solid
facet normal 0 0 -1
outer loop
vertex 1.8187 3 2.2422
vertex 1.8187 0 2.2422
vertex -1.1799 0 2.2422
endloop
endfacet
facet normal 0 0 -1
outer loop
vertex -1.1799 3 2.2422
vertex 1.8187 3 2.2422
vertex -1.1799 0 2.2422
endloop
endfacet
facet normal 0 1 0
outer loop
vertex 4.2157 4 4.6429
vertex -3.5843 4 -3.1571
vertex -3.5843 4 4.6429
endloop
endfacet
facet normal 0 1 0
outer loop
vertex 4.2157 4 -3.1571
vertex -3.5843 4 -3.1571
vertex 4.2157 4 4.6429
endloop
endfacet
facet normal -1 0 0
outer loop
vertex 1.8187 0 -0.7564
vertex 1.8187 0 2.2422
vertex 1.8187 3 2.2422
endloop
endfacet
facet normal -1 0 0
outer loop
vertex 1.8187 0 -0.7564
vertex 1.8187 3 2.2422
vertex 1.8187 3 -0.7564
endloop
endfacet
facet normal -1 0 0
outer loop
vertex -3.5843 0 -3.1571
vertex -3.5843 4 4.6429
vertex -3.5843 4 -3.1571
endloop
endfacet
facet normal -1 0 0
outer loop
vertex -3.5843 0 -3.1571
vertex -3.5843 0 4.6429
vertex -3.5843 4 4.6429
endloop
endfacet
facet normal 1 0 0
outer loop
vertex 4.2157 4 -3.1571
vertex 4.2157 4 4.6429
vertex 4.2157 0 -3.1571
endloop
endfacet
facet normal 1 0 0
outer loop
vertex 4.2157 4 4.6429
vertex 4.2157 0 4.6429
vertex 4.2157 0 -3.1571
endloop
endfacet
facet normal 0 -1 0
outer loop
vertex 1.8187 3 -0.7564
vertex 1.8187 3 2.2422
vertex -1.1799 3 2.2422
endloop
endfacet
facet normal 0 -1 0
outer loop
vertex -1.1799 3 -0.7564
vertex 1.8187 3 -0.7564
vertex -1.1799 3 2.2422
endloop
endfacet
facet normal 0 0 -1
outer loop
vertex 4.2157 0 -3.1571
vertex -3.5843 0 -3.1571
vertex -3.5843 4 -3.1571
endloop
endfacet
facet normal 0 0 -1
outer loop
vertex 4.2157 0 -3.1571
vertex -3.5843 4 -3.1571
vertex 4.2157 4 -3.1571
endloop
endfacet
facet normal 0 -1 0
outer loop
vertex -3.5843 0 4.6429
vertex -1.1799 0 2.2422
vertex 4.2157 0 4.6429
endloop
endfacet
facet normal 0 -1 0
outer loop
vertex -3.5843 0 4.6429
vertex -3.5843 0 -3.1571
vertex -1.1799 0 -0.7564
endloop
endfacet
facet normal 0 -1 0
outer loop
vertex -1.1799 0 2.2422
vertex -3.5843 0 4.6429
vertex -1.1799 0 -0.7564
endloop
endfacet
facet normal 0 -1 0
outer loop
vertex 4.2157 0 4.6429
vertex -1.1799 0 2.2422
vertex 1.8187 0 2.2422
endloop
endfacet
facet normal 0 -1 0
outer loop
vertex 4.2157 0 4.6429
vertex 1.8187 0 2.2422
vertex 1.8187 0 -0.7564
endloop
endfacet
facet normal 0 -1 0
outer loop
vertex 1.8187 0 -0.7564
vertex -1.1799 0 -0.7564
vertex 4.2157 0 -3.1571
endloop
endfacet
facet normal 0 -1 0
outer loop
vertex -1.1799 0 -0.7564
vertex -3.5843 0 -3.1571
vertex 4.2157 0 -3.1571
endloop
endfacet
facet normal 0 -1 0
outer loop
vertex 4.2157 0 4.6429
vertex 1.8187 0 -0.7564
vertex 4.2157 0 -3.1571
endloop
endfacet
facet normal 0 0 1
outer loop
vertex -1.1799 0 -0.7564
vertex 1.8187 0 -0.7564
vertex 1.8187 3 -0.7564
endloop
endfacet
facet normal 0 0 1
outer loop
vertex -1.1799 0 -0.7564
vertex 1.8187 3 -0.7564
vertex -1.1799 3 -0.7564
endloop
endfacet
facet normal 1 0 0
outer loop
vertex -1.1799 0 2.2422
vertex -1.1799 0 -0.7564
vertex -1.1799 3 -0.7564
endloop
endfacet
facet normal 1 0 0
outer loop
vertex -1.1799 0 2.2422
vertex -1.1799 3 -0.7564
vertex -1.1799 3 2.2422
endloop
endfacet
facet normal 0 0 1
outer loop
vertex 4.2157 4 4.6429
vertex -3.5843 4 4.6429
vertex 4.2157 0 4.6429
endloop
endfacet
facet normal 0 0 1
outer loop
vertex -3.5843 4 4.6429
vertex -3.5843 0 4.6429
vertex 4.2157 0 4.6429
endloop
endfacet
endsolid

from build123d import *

# Parameters (mm, degrees)
SKETCH1_W           = 7.8
SKETCH1_H           = 7.8
BOSS_EXTRUDE1_DEPTH = 3
SKETCH3_W           = 7.8
SKETCH3_H           = 7.8
BOSS_EXTRUDE2_DEPTH = 1
CUT_EXTRUDE1_DEPTH  = 3


with BuildPart() as part:
    # Sketch1 → Boss-Extrude1 (new body)
    with BuildSketch(Plane(origin=(0, 0, 0), x_dir=(1, 0, 0), z_dir=(0, 1, 0))):
        with Locations((0.315714286, -0.742857143)):
            Rectangle(SKETCH1_W, SKETCH1_H)
    extrude(amount=BOSS_EXTRUDE1_DEPTH)

    # Sketch3 → Boss-Extrude2 (add)
    with BuildSketch(Plane(origin=(0, 3, 0), x_dir=(1, 0, 0), z_dir=(0, 1, 0))):
        with Locations((0.315714286, -0.742857143)):
            Rectangle(SKETCH3_W, SKETCH3_H)
    extrude(amount=BOSS_EXTRUDE2_DEPTH)

    # Sketch4 → Cut-Extrude1 (cut)
    with BuildSketch(Plane.XZ):
        Polygon((0.319353372, 2.24216051), (1.818656739, 2.24216051), (1.818656739, -0.756446224), (-1.179949996, -0.756446224), (-1.179949996, 2.24216051), align=None)
    extrude(amount=-CUT_EXTRUDE1_DEPTH, mode=Mode.SUBTRACT)


solid = part.part
